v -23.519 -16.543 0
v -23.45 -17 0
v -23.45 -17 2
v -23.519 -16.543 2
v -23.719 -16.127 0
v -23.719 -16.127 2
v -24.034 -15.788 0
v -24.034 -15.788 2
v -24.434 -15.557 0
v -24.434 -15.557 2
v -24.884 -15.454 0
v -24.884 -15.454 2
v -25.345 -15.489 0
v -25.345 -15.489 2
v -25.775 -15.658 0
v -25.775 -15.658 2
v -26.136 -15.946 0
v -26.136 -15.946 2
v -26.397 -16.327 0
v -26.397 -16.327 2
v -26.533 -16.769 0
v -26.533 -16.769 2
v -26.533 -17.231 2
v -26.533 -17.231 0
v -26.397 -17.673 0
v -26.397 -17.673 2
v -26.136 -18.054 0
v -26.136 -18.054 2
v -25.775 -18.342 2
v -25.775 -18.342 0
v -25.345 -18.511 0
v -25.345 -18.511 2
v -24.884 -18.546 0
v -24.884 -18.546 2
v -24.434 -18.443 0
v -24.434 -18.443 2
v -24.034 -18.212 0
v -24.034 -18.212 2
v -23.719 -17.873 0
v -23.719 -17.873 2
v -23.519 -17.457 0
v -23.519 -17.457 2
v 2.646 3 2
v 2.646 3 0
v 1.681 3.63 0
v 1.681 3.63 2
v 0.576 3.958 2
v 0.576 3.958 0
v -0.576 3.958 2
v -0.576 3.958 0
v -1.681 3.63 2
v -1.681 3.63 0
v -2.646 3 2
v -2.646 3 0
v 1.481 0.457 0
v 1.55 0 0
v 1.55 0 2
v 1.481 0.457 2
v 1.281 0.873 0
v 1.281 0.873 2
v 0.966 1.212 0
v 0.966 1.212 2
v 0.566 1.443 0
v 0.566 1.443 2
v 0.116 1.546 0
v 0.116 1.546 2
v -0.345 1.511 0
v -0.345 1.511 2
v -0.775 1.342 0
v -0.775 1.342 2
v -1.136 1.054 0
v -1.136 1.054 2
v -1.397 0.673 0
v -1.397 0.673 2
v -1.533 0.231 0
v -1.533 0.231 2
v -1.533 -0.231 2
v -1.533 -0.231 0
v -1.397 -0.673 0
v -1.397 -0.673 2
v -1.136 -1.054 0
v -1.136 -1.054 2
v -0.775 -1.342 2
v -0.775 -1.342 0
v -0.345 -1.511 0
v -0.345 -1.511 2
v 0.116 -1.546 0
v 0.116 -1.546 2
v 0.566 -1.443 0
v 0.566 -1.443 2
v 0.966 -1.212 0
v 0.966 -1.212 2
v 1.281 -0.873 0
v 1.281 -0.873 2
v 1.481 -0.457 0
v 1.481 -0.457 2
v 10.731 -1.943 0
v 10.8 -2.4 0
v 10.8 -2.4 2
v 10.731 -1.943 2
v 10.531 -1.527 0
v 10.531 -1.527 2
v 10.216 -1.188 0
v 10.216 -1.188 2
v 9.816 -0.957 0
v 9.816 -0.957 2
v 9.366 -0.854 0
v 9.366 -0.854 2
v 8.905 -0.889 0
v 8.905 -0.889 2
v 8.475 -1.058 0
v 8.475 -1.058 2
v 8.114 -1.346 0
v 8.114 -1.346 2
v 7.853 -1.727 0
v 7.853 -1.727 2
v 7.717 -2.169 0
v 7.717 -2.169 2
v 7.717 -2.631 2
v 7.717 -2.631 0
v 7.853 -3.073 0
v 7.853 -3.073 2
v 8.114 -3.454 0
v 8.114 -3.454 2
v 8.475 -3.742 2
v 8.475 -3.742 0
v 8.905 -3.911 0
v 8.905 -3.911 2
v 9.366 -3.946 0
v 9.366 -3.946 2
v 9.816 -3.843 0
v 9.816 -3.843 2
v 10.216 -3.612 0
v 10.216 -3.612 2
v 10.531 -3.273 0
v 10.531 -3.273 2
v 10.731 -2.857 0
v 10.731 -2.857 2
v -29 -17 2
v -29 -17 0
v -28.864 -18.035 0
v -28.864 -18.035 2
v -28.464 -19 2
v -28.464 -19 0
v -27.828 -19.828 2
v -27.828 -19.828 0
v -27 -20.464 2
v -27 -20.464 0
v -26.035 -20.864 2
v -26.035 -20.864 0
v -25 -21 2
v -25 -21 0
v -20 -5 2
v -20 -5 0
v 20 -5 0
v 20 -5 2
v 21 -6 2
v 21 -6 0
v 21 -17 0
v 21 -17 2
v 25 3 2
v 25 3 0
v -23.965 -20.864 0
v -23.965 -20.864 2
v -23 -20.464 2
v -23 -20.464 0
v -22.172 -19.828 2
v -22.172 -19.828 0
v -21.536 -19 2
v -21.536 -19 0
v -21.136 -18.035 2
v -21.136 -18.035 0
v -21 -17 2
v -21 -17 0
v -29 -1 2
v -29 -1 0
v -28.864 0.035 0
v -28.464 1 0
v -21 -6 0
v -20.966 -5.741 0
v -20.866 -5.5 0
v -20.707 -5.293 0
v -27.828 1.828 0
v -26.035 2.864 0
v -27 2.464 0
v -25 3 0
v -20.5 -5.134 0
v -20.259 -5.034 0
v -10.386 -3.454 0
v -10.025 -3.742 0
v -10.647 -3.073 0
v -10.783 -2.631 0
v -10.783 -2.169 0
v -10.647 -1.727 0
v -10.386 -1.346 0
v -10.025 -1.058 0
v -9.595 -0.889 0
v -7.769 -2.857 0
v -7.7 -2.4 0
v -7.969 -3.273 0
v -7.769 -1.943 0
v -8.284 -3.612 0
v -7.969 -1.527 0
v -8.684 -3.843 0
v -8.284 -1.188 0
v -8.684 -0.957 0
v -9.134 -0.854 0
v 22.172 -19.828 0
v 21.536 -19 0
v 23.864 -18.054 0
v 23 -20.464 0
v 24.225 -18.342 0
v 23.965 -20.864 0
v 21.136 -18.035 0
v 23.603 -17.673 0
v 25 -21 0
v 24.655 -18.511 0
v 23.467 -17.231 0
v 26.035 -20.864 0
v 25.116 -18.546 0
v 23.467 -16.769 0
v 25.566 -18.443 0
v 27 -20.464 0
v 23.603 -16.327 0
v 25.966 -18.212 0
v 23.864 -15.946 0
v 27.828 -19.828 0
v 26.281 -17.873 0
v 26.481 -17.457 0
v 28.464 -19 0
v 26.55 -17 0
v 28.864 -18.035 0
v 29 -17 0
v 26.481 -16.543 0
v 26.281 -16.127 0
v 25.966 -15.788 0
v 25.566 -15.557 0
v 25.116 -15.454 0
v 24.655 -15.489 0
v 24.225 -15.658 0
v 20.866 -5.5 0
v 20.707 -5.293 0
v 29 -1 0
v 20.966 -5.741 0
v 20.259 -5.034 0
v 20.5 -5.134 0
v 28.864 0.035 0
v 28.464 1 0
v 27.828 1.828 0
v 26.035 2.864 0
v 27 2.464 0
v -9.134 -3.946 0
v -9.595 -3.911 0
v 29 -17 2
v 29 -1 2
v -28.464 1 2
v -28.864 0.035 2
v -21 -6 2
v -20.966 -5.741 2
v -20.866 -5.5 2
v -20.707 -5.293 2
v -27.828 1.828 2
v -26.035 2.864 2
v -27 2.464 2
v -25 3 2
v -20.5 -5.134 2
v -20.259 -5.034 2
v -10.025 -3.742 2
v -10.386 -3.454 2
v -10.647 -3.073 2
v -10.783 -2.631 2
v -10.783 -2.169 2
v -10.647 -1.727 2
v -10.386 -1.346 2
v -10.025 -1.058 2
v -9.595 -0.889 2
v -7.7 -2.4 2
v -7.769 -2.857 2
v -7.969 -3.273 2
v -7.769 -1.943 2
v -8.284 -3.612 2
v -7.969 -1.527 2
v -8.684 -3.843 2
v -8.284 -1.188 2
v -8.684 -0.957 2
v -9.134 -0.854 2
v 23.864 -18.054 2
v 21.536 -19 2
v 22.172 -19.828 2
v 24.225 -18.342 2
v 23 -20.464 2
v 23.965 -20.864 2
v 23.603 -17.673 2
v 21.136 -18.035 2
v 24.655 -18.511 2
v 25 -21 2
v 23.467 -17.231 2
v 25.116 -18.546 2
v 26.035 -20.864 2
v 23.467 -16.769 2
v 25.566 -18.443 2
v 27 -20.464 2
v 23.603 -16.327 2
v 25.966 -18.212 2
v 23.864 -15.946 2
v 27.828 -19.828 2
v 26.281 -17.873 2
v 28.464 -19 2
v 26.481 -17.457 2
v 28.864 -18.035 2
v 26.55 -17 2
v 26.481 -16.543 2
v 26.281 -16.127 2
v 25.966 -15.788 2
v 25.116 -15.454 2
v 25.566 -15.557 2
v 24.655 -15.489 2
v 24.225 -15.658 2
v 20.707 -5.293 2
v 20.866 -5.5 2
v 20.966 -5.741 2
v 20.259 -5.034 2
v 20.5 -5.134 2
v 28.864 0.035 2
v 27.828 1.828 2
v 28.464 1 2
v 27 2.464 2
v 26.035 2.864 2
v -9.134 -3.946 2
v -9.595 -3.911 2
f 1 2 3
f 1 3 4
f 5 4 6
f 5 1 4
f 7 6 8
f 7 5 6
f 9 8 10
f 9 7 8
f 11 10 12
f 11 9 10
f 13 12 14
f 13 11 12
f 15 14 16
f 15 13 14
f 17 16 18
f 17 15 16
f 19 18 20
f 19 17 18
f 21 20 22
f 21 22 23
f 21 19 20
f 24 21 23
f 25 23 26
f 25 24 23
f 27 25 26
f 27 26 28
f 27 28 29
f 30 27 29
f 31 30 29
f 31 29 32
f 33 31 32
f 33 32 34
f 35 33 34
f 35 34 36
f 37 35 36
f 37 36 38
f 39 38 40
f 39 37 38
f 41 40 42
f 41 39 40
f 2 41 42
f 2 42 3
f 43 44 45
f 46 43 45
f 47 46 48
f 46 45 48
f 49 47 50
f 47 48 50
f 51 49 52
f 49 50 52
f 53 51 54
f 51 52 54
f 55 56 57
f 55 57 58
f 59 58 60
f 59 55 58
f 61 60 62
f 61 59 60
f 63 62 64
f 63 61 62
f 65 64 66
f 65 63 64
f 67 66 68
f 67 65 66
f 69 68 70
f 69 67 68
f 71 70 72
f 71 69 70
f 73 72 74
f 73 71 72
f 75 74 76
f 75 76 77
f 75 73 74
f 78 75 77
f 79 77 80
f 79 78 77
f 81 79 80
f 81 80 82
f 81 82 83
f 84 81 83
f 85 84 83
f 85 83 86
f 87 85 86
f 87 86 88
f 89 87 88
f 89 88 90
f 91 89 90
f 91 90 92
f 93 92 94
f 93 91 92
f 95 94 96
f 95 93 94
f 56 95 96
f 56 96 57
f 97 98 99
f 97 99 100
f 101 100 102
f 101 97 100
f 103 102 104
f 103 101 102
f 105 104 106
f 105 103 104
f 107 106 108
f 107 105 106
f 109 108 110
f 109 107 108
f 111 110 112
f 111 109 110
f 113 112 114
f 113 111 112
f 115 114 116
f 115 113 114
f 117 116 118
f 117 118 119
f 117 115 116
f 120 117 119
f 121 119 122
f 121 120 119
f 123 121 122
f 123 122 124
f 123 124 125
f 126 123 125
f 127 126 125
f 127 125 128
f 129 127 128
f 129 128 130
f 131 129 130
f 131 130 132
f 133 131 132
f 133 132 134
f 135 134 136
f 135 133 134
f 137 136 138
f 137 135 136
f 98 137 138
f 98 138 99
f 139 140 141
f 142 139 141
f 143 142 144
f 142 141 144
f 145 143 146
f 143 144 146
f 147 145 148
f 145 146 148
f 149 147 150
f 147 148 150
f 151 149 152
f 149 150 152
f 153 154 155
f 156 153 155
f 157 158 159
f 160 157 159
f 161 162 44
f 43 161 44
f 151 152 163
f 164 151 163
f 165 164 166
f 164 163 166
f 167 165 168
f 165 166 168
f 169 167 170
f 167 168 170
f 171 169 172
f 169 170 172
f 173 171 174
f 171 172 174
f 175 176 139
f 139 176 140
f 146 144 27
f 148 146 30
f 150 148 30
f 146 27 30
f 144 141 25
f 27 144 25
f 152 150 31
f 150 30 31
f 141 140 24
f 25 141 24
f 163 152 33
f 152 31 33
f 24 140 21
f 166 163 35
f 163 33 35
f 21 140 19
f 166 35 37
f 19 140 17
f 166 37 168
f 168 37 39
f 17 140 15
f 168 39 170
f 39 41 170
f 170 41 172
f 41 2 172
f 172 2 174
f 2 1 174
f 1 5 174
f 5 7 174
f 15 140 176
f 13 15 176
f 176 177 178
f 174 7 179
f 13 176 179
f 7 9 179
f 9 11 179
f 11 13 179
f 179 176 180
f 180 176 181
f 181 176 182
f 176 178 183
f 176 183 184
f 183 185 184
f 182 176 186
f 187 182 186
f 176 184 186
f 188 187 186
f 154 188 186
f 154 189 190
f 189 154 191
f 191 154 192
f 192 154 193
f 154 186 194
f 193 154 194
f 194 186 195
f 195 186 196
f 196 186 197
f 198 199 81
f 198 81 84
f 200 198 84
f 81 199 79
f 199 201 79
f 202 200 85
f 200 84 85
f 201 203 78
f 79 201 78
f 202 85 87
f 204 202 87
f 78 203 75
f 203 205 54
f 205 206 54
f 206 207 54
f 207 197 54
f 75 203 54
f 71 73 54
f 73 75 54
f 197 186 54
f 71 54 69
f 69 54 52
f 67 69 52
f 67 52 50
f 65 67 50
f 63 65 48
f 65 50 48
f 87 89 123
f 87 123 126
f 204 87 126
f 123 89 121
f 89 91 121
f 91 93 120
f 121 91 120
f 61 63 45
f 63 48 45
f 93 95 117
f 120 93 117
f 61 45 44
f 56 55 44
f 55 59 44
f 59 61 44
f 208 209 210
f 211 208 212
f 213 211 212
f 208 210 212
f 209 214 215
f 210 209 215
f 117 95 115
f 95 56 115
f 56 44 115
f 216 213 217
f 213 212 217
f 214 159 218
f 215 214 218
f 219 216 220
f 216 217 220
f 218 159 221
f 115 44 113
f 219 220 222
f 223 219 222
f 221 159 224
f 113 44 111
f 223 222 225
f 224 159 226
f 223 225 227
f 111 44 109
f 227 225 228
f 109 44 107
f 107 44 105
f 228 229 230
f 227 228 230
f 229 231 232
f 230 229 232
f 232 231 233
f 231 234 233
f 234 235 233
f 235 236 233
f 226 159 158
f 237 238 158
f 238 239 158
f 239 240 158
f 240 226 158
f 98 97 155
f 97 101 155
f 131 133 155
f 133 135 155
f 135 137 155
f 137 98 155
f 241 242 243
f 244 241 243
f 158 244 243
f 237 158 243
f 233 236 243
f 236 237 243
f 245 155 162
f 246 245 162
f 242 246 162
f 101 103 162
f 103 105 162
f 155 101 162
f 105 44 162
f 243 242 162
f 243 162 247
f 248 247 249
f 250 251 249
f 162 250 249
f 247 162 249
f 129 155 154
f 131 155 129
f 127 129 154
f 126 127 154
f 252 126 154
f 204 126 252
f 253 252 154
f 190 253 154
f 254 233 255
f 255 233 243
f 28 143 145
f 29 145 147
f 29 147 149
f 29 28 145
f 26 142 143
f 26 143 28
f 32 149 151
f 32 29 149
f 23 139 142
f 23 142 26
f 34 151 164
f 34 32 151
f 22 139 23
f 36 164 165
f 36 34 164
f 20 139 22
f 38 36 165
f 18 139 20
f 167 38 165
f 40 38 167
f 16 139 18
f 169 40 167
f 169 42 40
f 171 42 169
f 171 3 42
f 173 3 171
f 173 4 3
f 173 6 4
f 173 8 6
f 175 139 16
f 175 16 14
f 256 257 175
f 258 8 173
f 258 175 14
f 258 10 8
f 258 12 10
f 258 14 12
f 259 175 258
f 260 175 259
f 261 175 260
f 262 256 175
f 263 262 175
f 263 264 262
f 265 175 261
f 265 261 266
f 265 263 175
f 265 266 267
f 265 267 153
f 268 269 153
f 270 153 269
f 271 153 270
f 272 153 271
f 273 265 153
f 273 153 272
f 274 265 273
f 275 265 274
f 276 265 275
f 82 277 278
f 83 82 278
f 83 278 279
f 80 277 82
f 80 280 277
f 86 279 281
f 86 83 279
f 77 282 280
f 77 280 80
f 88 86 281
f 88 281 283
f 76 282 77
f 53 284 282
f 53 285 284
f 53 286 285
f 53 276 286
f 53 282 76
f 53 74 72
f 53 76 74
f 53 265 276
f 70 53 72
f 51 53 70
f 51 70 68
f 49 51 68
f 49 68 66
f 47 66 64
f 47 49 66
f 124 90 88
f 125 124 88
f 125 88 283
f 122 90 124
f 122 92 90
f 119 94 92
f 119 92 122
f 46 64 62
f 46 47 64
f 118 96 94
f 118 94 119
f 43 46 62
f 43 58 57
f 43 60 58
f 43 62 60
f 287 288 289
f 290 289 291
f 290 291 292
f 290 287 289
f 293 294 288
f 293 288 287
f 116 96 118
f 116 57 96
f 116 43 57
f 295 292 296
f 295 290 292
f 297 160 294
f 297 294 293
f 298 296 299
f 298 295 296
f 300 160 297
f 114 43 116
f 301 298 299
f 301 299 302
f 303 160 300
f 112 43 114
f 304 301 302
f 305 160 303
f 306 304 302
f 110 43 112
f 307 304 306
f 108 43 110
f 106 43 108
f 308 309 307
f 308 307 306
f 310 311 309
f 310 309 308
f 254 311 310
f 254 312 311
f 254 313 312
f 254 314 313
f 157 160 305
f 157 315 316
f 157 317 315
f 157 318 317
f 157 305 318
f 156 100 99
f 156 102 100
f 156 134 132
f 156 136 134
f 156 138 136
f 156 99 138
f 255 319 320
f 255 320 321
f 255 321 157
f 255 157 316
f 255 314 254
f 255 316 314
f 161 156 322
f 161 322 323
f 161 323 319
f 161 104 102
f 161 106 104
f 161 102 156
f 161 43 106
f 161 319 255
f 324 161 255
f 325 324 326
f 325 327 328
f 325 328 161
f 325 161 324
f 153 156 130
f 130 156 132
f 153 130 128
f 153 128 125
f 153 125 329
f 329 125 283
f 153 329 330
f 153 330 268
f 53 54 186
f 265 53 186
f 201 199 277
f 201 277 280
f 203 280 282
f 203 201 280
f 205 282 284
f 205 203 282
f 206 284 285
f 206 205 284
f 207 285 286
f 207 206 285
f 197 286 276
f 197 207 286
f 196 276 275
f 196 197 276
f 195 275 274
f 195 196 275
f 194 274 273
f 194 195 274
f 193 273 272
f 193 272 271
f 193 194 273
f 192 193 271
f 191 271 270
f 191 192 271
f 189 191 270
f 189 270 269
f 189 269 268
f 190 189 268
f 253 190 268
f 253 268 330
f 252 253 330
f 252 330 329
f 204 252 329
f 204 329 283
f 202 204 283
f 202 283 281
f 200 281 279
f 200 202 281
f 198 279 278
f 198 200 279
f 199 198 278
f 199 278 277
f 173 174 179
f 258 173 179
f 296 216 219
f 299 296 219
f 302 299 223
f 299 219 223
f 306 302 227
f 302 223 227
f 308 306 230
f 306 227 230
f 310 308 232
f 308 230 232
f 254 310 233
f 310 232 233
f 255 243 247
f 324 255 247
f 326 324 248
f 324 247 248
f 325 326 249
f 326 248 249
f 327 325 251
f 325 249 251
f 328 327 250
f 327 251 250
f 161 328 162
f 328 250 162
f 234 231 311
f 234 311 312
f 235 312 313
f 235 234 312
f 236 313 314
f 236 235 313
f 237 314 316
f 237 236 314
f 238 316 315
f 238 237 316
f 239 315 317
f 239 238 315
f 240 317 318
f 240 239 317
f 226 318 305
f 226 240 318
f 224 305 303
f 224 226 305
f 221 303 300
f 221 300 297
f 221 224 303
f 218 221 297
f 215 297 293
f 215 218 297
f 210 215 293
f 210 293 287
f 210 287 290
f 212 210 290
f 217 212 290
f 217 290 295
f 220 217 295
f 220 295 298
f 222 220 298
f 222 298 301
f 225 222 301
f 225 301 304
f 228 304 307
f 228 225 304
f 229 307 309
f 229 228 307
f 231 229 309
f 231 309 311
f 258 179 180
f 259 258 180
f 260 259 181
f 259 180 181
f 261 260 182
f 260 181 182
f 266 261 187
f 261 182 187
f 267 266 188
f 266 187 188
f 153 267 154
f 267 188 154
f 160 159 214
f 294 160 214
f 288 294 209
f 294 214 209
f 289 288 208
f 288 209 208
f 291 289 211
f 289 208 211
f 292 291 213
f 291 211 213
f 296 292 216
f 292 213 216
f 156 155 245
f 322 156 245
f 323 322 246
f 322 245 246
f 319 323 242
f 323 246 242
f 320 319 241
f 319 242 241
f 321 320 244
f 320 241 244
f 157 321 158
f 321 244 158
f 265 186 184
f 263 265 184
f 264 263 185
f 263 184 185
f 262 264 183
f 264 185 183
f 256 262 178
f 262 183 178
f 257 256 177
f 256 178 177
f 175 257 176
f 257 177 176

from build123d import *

# Parameters (mm, degrees)
F0_R     = 1.55
F1_DEPTH = 2


with BuildPart() as f1:
    # F0 (on Top) → F1 (new body)
    with BuildSketch(Plane.XY):
        with BuildLine():
            Line((-20, -5), (20, -5))
            ThreePointArc((20, -5), (20.707107, -5.292893), (21, -6))
            Line((21, -6), (21, -17))
            ThreePointArc((21, -17), (22.171573, -19.828427), (25, -21))
            ThreePointArc((25, -21), (27.828427, -19.828427), (29, -17))
            Line((29, -17), (29, -1))
            ThreePointArc((29, -1), (27.828427, 1.828427), (25, 3))
            Line((25, 3), (2.645751, 3))
            ThreePointArc((2.645751, 3), (0, 4), (-2.645751, 3))
            Line((-2.645751, 3), (-25, 3))
            ThreePointArc((-25, 3), (-27.828427, 1.828427), (-29, -1))
            Line((-29, -1), (-29, -17))
            ThreePointArc((-29, -17), (-27.828427, -19.828427), (-25, -21))
            ThreePointArc((-25, -21), (-22.171573, -19.828427), (-21, -17))
            Line((-21, -17), (-21, -6))
            ThreePointArc((-21, -6), (-20.707107, -5.292893), (-20, -5))
        make_face()
        with Locations((-25, -17)):
            Circle(F0_R, mode=Mode.SUBTRACT)
        with Locations((25, -17)):
            Circle(F0_R, mode=Mode.SUBTRACT)
        with Locations((-9.25, -2.4)):
            Circle(F0_R, mode=Mode.SUBTRACT)
        with Locations((9.25, -2.4)):
            Circle(F0_R, mode=Mode.SUBTRACT)
        Circle(F0_R, mode=Mode.SUBTRACT)
    extrude(amount=F1_DEPTH)


solid = f1.part
